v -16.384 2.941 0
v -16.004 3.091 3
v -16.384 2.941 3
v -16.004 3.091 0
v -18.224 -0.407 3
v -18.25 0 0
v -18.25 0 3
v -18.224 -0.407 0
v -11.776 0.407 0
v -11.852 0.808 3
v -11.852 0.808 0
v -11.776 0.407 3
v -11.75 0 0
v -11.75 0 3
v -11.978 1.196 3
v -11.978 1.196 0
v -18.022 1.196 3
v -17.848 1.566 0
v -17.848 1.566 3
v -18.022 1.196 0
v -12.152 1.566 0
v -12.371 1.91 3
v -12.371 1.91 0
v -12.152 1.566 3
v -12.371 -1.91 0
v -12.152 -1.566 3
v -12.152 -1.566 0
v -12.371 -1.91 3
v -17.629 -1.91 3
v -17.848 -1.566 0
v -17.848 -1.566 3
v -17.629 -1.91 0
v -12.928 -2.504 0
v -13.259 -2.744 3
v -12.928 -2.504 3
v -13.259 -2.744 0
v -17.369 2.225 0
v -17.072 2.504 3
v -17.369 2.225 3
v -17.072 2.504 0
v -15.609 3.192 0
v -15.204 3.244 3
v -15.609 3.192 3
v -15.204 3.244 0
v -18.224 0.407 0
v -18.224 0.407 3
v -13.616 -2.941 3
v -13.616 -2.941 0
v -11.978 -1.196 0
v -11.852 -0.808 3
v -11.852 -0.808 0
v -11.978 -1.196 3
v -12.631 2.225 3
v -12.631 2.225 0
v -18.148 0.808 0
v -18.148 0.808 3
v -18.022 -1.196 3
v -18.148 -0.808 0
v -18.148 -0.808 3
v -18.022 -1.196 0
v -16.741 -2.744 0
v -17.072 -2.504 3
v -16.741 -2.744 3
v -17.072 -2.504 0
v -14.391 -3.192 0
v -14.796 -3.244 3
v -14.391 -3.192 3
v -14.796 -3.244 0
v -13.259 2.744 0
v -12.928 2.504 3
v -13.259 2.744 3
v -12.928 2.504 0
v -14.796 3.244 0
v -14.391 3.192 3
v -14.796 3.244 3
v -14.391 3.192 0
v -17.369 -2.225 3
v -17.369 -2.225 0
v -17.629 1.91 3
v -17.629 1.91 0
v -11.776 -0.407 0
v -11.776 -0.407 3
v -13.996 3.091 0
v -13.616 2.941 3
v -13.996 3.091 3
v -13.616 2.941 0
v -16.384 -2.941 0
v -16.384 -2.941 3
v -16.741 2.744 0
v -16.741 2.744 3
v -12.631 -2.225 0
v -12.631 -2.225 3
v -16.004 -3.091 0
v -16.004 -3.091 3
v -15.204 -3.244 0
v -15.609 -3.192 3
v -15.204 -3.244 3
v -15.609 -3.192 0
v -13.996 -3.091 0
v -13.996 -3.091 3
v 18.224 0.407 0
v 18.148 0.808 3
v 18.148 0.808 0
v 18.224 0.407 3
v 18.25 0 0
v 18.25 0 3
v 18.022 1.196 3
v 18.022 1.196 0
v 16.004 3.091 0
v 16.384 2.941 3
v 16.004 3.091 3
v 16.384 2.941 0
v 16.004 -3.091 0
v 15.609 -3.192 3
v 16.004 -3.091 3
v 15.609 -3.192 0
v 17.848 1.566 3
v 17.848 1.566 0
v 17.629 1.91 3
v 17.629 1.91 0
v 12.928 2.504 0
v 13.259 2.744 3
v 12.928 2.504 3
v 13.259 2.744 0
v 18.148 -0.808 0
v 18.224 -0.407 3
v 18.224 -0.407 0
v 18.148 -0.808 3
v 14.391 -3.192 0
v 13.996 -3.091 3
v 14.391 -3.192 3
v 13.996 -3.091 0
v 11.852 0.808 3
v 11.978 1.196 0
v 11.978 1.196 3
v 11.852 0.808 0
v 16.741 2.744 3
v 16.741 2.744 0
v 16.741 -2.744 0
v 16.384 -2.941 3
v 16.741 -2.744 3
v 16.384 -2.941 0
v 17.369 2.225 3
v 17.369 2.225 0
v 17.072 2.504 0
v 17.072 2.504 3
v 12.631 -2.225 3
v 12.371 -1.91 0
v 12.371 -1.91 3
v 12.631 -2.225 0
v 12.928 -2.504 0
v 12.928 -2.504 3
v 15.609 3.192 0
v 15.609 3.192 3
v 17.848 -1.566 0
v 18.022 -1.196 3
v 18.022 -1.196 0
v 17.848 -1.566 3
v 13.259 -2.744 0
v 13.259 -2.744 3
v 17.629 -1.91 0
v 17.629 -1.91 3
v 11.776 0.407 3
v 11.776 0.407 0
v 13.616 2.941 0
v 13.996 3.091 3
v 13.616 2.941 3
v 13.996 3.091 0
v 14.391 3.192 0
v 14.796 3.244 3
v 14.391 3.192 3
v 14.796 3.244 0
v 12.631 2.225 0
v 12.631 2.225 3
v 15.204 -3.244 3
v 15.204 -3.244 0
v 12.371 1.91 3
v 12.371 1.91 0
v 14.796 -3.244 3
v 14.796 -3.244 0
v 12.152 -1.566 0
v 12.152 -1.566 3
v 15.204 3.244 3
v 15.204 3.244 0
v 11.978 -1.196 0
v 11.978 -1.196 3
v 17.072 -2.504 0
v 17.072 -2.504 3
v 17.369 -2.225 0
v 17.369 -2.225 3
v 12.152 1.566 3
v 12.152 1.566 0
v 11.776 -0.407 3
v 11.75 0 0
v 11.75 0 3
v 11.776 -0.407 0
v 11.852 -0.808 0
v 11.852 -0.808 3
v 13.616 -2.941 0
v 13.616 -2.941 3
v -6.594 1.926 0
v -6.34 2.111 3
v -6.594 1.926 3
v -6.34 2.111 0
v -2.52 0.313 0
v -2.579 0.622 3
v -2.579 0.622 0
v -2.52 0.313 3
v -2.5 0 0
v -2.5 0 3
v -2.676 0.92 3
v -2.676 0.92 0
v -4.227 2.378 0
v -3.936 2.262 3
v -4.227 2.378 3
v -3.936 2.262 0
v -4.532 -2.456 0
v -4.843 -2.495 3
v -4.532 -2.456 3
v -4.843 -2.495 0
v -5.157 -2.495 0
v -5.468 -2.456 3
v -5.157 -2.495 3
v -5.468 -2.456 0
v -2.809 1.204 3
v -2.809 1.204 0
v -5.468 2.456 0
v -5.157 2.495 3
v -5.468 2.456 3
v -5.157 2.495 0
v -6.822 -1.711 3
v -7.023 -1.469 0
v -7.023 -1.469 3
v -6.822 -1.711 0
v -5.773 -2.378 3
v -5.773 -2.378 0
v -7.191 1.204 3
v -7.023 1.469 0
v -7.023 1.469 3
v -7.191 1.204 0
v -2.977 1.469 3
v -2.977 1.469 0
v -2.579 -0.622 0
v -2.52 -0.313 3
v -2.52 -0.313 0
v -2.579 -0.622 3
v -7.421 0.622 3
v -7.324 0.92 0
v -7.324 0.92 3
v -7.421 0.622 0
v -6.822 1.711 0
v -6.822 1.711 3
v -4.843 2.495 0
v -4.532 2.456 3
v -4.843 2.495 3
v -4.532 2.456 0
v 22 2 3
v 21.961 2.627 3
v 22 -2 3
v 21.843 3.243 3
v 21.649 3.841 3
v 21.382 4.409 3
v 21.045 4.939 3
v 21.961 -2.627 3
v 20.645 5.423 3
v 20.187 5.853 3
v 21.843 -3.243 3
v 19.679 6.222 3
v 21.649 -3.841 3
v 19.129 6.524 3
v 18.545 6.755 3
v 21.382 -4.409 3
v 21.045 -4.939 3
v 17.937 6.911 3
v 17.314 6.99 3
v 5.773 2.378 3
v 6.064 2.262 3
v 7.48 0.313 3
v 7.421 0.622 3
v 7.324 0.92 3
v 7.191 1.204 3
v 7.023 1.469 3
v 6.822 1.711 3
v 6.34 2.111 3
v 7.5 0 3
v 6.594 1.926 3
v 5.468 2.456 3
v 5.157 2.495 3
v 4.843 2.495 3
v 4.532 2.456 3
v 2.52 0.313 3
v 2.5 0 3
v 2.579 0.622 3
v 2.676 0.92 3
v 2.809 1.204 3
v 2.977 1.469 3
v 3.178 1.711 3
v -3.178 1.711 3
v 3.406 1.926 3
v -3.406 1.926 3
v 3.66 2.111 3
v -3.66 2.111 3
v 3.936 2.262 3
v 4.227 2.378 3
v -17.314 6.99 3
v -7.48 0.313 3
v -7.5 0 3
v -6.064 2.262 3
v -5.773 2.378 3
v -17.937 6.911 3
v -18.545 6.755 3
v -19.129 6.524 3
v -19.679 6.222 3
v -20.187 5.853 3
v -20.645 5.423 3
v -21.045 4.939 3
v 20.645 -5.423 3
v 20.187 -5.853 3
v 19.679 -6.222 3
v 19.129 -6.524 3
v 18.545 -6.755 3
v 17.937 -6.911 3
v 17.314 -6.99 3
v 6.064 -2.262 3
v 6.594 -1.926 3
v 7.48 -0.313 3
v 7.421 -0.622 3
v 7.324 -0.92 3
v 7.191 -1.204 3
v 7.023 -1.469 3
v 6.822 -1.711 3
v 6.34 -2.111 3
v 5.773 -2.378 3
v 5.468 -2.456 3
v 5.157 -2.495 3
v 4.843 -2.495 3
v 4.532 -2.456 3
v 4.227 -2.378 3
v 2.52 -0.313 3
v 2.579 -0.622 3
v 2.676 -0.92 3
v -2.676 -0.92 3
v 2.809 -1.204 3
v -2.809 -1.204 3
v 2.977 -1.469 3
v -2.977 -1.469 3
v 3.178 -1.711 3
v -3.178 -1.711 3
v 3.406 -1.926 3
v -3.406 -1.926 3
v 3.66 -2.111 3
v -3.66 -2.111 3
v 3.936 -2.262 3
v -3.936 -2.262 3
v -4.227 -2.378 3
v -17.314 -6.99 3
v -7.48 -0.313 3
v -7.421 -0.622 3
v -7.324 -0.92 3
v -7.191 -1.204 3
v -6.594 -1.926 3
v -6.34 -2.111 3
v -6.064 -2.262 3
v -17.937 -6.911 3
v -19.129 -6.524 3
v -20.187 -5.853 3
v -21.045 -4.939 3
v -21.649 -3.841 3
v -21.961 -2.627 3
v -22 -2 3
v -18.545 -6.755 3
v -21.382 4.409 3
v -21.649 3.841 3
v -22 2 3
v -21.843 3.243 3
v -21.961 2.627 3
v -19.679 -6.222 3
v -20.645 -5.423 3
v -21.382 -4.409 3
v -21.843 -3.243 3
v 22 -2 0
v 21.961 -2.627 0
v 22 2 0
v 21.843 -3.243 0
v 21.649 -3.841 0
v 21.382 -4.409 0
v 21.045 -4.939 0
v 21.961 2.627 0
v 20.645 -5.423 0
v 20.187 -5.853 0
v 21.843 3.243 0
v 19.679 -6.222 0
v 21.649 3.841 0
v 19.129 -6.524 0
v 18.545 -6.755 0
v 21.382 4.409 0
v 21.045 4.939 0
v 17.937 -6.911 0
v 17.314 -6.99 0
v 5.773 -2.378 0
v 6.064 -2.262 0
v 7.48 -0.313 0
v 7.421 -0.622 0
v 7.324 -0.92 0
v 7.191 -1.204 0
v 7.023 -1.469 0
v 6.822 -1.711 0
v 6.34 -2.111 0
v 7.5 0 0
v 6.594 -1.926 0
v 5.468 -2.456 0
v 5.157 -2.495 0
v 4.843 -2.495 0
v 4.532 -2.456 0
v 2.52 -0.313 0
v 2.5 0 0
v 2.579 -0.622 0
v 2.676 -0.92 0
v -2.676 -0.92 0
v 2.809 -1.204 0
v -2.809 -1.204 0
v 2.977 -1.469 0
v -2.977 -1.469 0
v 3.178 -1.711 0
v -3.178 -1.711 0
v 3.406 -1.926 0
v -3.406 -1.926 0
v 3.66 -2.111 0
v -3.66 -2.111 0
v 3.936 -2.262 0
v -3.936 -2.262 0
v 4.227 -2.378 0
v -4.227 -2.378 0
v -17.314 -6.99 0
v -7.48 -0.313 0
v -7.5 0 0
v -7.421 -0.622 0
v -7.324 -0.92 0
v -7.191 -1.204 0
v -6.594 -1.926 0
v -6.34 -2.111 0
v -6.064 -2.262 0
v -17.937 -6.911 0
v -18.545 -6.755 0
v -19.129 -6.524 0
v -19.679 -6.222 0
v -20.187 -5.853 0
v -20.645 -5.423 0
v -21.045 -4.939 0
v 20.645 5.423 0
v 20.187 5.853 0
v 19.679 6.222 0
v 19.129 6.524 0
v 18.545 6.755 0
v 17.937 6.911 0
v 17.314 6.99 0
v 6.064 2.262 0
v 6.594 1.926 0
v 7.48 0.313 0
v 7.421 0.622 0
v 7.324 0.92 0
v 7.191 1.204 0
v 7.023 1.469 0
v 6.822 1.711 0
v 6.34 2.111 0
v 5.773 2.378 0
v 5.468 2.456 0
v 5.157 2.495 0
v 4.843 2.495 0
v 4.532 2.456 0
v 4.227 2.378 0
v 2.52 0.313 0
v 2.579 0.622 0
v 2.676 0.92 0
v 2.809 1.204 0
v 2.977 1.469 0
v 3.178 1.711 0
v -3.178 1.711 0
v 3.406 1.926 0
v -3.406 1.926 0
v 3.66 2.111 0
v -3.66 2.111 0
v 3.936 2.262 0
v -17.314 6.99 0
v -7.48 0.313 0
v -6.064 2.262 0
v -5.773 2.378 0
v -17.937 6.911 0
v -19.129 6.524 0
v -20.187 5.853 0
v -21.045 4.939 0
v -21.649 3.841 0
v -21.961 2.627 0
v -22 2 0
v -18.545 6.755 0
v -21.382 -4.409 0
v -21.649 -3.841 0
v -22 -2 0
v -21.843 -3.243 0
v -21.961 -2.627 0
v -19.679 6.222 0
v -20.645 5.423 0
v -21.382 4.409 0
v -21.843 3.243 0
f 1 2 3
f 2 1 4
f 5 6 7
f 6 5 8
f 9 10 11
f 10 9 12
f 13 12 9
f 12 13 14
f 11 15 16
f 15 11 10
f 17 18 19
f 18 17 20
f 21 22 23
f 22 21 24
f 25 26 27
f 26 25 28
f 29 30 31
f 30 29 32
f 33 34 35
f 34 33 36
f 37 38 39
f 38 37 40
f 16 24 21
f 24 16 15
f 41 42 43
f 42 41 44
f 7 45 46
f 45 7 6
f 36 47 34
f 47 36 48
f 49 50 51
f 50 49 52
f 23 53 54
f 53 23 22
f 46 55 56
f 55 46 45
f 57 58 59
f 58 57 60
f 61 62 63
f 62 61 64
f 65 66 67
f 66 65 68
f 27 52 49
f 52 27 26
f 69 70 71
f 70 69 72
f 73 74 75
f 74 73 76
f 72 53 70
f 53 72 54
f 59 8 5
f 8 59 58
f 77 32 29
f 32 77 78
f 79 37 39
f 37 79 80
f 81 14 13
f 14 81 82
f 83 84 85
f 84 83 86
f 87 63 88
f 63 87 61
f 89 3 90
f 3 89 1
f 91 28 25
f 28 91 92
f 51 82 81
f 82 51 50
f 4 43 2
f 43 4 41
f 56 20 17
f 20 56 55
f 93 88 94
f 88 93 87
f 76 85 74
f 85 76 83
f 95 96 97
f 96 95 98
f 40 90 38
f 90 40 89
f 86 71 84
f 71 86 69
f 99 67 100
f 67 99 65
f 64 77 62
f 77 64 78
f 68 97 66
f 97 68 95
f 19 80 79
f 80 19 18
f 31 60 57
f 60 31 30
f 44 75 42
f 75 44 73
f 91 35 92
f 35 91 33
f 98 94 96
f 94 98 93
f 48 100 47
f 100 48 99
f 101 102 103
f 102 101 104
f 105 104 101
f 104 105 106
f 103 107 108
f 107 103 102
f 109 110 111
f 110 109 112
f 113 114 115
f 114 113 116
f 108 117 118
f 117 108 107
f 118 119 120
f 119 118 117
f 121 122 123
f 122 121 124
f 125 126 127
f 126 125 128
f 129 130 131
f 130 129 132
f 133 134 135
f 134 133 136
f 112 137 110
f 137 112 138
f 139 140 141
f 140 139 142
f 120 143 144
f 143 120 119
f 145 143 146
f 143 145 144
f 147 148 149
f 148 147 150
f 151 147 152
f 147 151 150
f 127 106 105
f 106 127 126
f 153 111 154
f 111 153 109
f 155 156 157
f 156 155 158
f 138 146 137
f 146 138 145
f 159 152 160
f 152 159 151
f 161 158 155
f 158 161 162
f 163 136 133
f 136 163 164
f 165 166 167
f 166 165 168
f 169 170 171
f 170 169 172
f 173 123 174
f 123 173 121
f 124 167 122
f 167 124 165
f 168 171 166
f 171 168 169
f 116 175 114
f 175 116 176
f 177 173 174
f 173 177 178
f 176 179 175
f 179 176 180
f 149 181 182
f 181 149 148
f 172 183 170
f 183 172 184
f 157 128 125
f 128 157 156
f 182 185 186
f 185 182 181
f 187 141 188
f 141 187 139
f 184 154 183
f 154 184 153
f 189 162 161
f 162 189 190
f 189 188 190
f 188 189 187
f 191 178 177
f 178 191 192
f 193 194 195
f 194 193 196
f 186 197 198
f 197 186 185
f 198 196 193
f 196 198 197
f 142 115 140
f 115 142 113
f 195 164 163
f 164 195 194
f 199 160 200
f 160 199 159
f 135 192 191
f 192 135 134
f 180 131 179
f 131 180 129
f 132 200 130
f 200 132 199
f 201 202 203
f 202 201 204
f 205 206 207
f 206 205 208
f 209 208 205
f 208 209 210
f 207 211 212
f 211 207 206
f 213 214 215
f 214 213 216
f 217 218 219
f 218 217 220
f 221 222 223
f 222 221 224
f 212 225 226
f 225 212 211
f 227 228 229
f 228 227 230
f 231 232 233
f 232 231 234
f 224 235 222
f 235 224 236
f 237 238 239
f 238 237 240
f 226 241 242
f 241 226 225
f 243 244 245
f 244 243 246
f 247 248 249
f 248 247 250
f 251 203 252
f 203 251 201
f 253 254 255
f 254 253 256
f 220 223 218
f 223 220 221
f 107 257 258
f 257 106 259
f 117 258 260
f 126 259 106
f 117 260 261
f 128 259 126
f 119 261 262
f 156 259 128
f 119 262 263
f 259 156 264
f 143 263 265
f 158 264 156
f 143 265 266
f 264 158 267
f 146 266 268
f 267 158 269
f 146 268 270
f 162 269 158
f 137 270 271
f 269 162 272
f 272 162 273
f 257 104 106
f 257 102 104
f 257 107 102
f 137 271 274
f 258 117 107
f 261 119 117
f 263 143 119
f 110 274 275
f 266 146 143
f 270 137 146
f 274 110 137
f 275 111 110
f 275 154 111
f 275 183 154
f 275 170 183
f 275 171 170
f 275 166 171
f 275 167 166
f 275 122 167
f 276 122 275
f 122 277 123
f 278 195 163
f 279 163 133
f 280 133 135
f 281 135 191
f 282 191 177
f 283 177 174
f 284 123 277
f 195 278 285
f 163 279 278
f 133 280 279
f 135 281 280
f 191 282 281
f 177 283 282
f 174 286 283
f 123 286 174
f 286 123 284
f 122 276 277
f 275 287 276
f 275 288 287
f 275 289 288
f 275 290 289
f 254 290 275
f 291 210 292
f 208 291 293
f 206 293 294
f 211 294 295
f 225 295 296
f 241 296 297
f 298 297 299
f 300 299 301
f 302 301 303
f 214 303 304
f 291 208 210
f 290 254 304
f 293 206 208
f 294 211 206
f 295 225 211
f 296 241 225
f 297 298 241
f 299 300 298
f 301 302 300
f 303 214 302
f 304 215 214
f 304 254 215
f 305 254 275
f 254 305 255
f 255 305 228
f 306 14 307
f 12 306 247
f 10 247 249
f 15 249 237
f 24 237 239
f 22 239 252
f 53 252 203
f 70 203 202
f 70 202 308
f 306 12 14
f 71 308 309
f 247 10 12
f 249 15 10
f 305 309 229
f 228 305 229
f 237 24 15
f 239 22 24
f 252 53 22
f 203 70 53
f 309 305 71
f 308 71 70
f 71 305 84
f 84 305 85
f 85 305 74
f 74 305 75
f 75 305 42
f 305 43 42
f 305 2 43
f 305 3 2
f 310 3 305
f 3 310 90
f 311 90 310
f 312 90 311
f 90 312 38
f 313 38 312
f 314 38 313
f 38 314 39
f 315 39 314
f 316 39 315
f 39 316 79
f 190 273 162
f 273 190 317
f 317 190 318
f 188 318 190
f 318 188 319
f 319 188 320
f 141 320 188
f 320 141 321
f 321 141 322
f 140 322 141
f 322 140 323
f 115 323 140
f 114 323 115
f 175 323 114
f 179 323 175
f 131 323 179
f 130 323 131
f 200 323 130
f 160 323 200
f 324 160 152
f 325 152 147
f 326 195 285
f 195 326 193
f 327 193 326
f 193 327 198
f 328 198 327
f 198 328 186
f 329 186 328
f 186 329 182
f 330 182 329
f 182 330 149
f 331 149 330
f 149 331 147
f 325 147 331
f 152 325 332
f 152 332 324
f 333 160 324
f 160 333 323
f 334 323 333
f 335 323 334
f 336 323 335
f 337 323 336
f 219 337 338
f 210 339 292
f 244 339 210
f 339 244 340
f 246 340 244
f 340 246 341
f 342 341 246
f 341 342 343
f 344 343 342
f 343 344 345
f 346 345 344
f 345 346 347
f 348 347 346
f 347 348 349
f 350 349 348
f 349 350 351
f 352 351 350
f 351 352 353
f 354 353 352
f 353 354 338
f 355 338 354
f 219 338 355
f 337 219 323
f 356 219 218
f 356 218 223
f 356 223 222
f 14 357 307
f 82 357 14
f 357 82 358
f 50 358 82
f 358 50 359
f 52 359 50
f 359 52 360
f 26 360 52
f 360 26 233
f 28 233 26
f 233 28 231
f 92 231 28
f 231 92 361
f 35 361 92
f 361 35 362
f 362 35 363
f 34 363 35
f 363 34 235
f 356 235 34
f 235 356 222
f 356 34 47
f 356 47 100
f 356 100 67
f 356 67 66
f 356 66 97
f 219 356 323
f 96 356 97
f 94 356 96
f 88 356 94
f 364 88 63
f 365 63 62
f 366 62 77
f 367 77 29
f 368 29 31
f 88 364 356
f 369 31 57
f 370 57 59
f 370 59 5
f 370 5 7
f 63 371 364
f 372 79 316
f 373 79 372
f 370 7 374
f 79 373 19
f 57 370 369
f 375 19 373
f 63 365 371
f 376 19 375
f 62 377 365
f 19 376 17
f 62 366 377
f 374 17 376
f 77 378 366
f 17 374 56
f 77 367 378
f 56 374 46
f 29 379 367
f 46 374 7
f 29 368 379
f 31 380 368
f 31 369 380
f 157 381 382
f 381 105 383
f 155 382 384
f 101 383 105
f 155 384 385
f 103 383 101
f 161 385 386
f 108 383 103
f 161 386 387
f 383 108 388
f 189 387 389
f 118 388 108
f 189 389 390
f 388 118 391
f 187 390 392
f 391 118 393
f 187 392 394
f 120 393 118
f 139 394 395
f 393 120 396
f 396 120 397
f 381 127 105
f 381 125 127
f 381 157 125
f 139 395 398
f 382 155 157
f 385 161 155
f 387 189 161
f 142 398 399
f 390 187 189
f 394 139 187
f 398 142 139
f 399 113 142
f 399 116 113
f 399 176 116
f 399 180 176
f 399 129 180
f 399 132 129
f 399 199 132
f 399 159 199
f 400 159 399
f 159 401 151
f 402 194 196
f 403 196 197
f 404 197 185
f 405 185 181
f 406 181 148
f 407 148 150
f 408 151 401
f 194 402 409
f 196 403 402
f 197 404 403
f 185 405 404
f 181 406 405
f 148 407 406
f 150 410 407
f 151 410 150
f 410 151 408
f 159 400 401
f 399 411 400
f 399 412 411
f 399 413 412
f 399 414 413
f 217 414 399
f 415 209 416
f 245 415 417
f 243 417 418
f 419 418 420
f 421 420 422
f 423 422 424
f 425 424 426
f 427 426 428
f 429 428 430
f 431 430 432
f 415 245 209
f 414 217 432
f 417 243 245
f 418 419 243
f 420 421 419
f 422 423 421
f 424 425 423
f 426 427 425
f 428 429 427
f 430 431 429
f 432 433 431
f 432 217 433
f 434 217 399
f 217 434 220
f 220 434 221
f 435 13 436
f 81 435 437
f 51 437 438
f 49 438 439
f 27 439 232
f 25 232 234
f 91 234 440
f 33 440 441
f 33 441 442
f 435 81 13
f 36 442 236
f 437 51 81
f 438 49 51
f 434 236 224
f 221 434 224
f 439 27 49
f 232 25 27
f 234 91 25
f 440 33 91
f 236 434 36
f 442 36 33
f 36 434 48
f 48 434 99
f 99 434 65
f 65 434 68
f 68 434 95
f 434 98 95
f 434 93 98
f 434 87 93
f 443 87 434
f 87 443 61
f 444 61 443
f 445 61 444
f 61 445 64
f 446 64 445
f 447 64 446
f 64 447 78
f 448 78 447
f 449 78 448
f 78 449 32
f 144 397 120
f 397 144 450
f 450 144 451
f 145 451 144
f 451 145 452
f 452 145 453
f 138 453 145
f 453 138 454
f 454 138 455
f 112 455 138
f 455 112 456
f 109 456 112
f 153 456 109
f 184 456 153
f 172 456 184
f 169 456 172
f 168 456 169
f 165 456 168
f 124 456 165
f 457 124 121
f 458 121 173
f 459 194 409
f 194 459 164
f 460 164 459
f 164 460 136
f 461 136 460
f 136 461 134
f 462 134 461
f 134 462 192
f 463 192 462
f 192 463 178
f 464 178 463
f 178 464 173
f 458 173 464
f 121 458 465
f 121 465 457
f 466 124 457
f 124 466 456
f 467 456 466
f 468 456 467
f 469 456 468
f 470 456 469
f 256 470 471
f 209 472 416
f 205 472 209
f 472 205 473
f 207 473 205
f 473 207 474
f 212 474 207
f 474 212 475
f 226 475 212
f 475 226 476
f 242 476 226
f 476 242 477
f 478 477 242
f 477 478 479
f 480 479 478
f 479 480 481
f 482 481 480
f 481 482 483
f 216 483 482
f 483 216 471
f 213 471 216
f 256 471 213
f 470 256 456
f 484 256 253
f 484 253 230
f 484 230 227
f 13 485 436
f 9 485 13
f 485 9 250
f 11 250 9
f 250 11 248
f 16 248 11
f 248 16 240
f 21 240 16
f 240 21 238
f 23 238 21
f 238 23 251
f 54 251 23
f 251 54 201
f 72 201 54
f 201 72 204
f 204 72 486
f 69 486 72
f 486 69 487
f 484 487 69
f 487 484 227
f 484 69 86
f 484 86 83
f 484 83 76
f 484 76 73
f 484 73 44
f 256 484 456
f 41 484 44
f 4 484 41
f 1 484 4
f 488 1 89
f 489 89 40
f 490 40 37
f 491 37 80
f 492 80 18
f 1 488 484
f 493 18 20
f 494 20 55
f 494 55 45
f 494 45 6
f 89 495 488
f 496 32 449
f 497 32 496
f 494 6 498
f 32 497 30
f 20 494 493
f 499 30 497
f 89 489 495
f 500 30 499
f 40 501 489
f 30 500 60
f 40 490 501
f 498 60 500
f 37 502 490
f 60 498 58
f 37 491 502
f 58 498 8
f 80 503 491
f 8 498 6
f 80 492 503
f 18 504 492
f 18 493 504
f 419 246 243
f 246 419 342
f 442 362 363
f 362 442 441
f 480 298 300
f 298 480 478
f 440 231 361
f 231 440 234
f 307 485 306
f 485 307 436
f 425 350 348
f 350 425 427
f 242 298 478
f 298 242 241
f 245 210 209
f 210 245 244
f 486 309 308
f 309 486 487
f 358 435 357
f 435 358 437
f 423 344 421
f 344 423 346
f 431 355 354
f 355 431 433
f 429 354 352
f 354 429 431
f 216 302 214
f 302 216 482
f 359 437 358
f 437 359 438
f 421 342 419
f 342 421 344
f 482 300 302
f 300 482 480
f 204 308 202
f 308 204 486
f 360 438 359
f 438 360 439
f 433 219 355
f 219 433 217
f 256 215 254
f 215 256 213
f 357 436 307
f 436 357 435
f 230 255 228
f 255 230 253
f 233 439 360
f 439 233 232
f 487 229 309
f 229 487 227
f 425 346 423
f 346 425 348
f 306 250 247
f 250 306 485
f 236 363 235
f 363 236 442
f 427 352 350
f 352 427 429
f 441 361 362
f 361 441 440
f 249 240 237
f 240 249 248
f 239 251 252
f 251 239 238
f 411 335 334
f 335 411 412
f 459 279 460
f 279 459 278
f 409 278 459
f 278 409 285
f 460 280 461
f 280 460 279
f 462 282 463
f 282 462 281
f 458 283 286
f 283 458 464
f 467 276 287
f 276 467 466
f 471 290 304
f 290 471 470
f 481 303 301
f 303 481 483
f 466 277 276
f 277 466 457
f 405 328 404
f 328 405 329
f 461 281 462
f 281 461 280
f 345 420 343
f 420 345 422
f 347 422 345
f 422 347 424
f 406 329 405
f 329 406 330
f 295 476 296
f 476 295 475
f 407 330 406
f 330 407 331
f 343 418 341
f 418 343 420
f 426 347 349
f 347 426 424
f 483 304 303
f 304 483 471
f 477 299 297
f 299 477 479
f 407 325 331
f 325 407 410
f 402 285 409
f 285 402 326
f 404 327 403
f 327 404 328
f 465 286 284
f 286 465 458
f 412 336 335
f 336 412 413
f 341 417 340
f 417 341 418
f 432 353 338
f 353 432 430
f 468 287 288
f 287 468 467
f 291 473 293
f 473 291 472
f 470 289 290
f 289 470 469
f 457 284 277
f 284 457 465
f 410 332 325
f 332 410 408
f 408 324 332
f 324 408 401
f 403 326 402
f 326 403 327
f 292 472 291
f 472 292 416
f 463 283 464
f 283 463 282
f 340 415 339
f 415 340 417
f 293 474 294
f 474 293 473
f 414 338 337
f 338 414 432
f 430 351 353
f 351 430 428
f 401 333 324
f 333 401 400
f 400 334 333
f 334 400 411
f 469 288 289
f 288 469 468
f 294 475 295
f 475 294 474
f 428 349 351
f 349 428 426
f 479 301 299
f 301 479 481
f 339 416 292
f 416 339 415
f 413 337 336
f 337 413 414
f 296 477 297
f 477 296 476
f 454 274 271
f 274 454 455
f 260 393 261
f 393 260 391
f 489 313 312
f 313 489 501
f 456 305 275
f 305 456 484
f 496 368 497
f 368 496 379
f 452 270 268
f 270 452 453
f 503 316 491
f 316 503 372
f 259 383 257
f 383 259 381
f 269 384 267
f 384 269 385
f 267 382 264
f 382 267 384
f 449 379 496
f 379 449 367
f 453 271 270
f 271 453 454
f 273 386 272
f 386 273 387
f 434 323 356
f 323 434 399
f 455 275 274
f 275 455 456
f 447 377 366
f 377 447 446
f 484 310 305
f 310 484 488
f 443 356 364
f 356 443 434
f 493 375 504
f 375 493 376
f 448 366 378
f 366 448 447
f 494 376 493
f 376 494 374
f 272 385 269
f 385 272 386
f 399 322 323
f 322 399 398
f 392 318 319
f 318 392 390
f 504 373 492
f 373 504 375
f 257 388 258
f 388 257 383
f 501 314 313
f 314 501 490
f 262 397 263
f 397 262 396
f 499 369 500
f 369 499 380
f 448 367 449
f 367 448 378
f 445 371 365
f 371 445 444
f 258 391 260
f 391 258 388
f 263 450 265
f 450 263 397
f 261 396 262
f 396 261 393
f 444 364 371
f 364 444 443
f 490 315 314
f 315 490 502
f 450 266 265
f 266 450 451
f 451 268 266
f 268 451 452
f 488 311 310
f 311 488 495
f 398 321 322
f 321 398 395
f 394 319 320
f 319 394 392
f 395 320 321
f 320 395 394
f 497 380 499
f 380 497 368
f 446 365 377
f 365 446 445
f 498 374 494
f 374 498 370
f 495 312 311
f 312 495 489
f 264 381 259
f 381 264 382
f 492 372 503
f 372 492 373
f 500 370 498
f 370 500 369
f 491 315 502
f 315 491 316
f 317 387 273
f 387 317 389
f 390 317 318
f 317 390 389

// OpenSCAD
$fn = 50;


difference() {
	union() {
		hull() {
			translate(v = [-17.0000000000, 2.0000000000, 0]) {
				cylinder(h = 3, r = 5);
			}
			translate(v = [17.0000000000, 2.0000000000, 0]) {
				cylinder(h = 3, r = 5);
			}
			translate(v = [-17.0000000000, -2.0000000000, 0]) {
				cylinder(h = 3, r = 5);
			}
			translate(v = [17.0000000000, -2.0000000000, 0]) {
				cylinder(h = 3, r = 5);
			}
		}
	}
	union() {
		#translate(v = [-15.0000000000, 0.0000000000, 0]) {
			cylinder(h = 3, r = 3.2500000000);
		}
		#translate(v = [15.0000000000, 0.0000000000, 0]) {
			cylinder(h = 3, r = 3.2500000000);
		}
		#translate(v = [-15.0000000000, 0.0000000000, -100.0000000000]) {
			cylinder(h = 200, r = 3.2500000000);
		}
		#translate(v = [-15.0000000000, 0.0000000000, -100.0000000000]) {
			cylinder(h = 200, r = 3.2500000000);
		}
		#translate(v = [15.0000000000, 0.0000000000, -100.0000000000]) {
			cylinder(h = 200, r = 3.2500000000);
		}
		#translate(v = [15.0000000000, 0.0000000000, -100.0000000000]) {
			cylinder(h = 200, r = 3.2500000000);
		}
		#translate(v = [-15.0000000000, 0.0000000000, 0]) {
			cylinder(h = 3, r = 1.8000000000);
		}
		#translate(v = [15.0000000000, 0.0000000000, 0]) {
			cylinder(h = 3, r = 1.8000000000);
		}
		#translate(v = [-15.0000000000, 0.0000000000, 0]) {
			cylinder(h = 3, r = 1.8000000000);
		}
		#translate(v = [15.0000000000, 0.0000000000, 0]) {
			cylinder(h = 3, r = 1.8000000000);
		}
		#translate(v = [-15.0000000000, 0.0000000000, 0]) {
			cylinder(h = 3, r = 1.8000000000);
		}
		#translate(v = [15.0000000000, 0.0000000000, 0]) {
			cylinder(h = 3, r = 1.8000000000);
		}
		#translate(v = [-5.0000000000, 0, 0]) {
			cylinder(h = 3, r = 2.5000000000);
		}
		#translate(v = [5.0000000000, 0, 0]) {
			cylinder(h = 3, r = 2.5000000000);
		}
	}
}
